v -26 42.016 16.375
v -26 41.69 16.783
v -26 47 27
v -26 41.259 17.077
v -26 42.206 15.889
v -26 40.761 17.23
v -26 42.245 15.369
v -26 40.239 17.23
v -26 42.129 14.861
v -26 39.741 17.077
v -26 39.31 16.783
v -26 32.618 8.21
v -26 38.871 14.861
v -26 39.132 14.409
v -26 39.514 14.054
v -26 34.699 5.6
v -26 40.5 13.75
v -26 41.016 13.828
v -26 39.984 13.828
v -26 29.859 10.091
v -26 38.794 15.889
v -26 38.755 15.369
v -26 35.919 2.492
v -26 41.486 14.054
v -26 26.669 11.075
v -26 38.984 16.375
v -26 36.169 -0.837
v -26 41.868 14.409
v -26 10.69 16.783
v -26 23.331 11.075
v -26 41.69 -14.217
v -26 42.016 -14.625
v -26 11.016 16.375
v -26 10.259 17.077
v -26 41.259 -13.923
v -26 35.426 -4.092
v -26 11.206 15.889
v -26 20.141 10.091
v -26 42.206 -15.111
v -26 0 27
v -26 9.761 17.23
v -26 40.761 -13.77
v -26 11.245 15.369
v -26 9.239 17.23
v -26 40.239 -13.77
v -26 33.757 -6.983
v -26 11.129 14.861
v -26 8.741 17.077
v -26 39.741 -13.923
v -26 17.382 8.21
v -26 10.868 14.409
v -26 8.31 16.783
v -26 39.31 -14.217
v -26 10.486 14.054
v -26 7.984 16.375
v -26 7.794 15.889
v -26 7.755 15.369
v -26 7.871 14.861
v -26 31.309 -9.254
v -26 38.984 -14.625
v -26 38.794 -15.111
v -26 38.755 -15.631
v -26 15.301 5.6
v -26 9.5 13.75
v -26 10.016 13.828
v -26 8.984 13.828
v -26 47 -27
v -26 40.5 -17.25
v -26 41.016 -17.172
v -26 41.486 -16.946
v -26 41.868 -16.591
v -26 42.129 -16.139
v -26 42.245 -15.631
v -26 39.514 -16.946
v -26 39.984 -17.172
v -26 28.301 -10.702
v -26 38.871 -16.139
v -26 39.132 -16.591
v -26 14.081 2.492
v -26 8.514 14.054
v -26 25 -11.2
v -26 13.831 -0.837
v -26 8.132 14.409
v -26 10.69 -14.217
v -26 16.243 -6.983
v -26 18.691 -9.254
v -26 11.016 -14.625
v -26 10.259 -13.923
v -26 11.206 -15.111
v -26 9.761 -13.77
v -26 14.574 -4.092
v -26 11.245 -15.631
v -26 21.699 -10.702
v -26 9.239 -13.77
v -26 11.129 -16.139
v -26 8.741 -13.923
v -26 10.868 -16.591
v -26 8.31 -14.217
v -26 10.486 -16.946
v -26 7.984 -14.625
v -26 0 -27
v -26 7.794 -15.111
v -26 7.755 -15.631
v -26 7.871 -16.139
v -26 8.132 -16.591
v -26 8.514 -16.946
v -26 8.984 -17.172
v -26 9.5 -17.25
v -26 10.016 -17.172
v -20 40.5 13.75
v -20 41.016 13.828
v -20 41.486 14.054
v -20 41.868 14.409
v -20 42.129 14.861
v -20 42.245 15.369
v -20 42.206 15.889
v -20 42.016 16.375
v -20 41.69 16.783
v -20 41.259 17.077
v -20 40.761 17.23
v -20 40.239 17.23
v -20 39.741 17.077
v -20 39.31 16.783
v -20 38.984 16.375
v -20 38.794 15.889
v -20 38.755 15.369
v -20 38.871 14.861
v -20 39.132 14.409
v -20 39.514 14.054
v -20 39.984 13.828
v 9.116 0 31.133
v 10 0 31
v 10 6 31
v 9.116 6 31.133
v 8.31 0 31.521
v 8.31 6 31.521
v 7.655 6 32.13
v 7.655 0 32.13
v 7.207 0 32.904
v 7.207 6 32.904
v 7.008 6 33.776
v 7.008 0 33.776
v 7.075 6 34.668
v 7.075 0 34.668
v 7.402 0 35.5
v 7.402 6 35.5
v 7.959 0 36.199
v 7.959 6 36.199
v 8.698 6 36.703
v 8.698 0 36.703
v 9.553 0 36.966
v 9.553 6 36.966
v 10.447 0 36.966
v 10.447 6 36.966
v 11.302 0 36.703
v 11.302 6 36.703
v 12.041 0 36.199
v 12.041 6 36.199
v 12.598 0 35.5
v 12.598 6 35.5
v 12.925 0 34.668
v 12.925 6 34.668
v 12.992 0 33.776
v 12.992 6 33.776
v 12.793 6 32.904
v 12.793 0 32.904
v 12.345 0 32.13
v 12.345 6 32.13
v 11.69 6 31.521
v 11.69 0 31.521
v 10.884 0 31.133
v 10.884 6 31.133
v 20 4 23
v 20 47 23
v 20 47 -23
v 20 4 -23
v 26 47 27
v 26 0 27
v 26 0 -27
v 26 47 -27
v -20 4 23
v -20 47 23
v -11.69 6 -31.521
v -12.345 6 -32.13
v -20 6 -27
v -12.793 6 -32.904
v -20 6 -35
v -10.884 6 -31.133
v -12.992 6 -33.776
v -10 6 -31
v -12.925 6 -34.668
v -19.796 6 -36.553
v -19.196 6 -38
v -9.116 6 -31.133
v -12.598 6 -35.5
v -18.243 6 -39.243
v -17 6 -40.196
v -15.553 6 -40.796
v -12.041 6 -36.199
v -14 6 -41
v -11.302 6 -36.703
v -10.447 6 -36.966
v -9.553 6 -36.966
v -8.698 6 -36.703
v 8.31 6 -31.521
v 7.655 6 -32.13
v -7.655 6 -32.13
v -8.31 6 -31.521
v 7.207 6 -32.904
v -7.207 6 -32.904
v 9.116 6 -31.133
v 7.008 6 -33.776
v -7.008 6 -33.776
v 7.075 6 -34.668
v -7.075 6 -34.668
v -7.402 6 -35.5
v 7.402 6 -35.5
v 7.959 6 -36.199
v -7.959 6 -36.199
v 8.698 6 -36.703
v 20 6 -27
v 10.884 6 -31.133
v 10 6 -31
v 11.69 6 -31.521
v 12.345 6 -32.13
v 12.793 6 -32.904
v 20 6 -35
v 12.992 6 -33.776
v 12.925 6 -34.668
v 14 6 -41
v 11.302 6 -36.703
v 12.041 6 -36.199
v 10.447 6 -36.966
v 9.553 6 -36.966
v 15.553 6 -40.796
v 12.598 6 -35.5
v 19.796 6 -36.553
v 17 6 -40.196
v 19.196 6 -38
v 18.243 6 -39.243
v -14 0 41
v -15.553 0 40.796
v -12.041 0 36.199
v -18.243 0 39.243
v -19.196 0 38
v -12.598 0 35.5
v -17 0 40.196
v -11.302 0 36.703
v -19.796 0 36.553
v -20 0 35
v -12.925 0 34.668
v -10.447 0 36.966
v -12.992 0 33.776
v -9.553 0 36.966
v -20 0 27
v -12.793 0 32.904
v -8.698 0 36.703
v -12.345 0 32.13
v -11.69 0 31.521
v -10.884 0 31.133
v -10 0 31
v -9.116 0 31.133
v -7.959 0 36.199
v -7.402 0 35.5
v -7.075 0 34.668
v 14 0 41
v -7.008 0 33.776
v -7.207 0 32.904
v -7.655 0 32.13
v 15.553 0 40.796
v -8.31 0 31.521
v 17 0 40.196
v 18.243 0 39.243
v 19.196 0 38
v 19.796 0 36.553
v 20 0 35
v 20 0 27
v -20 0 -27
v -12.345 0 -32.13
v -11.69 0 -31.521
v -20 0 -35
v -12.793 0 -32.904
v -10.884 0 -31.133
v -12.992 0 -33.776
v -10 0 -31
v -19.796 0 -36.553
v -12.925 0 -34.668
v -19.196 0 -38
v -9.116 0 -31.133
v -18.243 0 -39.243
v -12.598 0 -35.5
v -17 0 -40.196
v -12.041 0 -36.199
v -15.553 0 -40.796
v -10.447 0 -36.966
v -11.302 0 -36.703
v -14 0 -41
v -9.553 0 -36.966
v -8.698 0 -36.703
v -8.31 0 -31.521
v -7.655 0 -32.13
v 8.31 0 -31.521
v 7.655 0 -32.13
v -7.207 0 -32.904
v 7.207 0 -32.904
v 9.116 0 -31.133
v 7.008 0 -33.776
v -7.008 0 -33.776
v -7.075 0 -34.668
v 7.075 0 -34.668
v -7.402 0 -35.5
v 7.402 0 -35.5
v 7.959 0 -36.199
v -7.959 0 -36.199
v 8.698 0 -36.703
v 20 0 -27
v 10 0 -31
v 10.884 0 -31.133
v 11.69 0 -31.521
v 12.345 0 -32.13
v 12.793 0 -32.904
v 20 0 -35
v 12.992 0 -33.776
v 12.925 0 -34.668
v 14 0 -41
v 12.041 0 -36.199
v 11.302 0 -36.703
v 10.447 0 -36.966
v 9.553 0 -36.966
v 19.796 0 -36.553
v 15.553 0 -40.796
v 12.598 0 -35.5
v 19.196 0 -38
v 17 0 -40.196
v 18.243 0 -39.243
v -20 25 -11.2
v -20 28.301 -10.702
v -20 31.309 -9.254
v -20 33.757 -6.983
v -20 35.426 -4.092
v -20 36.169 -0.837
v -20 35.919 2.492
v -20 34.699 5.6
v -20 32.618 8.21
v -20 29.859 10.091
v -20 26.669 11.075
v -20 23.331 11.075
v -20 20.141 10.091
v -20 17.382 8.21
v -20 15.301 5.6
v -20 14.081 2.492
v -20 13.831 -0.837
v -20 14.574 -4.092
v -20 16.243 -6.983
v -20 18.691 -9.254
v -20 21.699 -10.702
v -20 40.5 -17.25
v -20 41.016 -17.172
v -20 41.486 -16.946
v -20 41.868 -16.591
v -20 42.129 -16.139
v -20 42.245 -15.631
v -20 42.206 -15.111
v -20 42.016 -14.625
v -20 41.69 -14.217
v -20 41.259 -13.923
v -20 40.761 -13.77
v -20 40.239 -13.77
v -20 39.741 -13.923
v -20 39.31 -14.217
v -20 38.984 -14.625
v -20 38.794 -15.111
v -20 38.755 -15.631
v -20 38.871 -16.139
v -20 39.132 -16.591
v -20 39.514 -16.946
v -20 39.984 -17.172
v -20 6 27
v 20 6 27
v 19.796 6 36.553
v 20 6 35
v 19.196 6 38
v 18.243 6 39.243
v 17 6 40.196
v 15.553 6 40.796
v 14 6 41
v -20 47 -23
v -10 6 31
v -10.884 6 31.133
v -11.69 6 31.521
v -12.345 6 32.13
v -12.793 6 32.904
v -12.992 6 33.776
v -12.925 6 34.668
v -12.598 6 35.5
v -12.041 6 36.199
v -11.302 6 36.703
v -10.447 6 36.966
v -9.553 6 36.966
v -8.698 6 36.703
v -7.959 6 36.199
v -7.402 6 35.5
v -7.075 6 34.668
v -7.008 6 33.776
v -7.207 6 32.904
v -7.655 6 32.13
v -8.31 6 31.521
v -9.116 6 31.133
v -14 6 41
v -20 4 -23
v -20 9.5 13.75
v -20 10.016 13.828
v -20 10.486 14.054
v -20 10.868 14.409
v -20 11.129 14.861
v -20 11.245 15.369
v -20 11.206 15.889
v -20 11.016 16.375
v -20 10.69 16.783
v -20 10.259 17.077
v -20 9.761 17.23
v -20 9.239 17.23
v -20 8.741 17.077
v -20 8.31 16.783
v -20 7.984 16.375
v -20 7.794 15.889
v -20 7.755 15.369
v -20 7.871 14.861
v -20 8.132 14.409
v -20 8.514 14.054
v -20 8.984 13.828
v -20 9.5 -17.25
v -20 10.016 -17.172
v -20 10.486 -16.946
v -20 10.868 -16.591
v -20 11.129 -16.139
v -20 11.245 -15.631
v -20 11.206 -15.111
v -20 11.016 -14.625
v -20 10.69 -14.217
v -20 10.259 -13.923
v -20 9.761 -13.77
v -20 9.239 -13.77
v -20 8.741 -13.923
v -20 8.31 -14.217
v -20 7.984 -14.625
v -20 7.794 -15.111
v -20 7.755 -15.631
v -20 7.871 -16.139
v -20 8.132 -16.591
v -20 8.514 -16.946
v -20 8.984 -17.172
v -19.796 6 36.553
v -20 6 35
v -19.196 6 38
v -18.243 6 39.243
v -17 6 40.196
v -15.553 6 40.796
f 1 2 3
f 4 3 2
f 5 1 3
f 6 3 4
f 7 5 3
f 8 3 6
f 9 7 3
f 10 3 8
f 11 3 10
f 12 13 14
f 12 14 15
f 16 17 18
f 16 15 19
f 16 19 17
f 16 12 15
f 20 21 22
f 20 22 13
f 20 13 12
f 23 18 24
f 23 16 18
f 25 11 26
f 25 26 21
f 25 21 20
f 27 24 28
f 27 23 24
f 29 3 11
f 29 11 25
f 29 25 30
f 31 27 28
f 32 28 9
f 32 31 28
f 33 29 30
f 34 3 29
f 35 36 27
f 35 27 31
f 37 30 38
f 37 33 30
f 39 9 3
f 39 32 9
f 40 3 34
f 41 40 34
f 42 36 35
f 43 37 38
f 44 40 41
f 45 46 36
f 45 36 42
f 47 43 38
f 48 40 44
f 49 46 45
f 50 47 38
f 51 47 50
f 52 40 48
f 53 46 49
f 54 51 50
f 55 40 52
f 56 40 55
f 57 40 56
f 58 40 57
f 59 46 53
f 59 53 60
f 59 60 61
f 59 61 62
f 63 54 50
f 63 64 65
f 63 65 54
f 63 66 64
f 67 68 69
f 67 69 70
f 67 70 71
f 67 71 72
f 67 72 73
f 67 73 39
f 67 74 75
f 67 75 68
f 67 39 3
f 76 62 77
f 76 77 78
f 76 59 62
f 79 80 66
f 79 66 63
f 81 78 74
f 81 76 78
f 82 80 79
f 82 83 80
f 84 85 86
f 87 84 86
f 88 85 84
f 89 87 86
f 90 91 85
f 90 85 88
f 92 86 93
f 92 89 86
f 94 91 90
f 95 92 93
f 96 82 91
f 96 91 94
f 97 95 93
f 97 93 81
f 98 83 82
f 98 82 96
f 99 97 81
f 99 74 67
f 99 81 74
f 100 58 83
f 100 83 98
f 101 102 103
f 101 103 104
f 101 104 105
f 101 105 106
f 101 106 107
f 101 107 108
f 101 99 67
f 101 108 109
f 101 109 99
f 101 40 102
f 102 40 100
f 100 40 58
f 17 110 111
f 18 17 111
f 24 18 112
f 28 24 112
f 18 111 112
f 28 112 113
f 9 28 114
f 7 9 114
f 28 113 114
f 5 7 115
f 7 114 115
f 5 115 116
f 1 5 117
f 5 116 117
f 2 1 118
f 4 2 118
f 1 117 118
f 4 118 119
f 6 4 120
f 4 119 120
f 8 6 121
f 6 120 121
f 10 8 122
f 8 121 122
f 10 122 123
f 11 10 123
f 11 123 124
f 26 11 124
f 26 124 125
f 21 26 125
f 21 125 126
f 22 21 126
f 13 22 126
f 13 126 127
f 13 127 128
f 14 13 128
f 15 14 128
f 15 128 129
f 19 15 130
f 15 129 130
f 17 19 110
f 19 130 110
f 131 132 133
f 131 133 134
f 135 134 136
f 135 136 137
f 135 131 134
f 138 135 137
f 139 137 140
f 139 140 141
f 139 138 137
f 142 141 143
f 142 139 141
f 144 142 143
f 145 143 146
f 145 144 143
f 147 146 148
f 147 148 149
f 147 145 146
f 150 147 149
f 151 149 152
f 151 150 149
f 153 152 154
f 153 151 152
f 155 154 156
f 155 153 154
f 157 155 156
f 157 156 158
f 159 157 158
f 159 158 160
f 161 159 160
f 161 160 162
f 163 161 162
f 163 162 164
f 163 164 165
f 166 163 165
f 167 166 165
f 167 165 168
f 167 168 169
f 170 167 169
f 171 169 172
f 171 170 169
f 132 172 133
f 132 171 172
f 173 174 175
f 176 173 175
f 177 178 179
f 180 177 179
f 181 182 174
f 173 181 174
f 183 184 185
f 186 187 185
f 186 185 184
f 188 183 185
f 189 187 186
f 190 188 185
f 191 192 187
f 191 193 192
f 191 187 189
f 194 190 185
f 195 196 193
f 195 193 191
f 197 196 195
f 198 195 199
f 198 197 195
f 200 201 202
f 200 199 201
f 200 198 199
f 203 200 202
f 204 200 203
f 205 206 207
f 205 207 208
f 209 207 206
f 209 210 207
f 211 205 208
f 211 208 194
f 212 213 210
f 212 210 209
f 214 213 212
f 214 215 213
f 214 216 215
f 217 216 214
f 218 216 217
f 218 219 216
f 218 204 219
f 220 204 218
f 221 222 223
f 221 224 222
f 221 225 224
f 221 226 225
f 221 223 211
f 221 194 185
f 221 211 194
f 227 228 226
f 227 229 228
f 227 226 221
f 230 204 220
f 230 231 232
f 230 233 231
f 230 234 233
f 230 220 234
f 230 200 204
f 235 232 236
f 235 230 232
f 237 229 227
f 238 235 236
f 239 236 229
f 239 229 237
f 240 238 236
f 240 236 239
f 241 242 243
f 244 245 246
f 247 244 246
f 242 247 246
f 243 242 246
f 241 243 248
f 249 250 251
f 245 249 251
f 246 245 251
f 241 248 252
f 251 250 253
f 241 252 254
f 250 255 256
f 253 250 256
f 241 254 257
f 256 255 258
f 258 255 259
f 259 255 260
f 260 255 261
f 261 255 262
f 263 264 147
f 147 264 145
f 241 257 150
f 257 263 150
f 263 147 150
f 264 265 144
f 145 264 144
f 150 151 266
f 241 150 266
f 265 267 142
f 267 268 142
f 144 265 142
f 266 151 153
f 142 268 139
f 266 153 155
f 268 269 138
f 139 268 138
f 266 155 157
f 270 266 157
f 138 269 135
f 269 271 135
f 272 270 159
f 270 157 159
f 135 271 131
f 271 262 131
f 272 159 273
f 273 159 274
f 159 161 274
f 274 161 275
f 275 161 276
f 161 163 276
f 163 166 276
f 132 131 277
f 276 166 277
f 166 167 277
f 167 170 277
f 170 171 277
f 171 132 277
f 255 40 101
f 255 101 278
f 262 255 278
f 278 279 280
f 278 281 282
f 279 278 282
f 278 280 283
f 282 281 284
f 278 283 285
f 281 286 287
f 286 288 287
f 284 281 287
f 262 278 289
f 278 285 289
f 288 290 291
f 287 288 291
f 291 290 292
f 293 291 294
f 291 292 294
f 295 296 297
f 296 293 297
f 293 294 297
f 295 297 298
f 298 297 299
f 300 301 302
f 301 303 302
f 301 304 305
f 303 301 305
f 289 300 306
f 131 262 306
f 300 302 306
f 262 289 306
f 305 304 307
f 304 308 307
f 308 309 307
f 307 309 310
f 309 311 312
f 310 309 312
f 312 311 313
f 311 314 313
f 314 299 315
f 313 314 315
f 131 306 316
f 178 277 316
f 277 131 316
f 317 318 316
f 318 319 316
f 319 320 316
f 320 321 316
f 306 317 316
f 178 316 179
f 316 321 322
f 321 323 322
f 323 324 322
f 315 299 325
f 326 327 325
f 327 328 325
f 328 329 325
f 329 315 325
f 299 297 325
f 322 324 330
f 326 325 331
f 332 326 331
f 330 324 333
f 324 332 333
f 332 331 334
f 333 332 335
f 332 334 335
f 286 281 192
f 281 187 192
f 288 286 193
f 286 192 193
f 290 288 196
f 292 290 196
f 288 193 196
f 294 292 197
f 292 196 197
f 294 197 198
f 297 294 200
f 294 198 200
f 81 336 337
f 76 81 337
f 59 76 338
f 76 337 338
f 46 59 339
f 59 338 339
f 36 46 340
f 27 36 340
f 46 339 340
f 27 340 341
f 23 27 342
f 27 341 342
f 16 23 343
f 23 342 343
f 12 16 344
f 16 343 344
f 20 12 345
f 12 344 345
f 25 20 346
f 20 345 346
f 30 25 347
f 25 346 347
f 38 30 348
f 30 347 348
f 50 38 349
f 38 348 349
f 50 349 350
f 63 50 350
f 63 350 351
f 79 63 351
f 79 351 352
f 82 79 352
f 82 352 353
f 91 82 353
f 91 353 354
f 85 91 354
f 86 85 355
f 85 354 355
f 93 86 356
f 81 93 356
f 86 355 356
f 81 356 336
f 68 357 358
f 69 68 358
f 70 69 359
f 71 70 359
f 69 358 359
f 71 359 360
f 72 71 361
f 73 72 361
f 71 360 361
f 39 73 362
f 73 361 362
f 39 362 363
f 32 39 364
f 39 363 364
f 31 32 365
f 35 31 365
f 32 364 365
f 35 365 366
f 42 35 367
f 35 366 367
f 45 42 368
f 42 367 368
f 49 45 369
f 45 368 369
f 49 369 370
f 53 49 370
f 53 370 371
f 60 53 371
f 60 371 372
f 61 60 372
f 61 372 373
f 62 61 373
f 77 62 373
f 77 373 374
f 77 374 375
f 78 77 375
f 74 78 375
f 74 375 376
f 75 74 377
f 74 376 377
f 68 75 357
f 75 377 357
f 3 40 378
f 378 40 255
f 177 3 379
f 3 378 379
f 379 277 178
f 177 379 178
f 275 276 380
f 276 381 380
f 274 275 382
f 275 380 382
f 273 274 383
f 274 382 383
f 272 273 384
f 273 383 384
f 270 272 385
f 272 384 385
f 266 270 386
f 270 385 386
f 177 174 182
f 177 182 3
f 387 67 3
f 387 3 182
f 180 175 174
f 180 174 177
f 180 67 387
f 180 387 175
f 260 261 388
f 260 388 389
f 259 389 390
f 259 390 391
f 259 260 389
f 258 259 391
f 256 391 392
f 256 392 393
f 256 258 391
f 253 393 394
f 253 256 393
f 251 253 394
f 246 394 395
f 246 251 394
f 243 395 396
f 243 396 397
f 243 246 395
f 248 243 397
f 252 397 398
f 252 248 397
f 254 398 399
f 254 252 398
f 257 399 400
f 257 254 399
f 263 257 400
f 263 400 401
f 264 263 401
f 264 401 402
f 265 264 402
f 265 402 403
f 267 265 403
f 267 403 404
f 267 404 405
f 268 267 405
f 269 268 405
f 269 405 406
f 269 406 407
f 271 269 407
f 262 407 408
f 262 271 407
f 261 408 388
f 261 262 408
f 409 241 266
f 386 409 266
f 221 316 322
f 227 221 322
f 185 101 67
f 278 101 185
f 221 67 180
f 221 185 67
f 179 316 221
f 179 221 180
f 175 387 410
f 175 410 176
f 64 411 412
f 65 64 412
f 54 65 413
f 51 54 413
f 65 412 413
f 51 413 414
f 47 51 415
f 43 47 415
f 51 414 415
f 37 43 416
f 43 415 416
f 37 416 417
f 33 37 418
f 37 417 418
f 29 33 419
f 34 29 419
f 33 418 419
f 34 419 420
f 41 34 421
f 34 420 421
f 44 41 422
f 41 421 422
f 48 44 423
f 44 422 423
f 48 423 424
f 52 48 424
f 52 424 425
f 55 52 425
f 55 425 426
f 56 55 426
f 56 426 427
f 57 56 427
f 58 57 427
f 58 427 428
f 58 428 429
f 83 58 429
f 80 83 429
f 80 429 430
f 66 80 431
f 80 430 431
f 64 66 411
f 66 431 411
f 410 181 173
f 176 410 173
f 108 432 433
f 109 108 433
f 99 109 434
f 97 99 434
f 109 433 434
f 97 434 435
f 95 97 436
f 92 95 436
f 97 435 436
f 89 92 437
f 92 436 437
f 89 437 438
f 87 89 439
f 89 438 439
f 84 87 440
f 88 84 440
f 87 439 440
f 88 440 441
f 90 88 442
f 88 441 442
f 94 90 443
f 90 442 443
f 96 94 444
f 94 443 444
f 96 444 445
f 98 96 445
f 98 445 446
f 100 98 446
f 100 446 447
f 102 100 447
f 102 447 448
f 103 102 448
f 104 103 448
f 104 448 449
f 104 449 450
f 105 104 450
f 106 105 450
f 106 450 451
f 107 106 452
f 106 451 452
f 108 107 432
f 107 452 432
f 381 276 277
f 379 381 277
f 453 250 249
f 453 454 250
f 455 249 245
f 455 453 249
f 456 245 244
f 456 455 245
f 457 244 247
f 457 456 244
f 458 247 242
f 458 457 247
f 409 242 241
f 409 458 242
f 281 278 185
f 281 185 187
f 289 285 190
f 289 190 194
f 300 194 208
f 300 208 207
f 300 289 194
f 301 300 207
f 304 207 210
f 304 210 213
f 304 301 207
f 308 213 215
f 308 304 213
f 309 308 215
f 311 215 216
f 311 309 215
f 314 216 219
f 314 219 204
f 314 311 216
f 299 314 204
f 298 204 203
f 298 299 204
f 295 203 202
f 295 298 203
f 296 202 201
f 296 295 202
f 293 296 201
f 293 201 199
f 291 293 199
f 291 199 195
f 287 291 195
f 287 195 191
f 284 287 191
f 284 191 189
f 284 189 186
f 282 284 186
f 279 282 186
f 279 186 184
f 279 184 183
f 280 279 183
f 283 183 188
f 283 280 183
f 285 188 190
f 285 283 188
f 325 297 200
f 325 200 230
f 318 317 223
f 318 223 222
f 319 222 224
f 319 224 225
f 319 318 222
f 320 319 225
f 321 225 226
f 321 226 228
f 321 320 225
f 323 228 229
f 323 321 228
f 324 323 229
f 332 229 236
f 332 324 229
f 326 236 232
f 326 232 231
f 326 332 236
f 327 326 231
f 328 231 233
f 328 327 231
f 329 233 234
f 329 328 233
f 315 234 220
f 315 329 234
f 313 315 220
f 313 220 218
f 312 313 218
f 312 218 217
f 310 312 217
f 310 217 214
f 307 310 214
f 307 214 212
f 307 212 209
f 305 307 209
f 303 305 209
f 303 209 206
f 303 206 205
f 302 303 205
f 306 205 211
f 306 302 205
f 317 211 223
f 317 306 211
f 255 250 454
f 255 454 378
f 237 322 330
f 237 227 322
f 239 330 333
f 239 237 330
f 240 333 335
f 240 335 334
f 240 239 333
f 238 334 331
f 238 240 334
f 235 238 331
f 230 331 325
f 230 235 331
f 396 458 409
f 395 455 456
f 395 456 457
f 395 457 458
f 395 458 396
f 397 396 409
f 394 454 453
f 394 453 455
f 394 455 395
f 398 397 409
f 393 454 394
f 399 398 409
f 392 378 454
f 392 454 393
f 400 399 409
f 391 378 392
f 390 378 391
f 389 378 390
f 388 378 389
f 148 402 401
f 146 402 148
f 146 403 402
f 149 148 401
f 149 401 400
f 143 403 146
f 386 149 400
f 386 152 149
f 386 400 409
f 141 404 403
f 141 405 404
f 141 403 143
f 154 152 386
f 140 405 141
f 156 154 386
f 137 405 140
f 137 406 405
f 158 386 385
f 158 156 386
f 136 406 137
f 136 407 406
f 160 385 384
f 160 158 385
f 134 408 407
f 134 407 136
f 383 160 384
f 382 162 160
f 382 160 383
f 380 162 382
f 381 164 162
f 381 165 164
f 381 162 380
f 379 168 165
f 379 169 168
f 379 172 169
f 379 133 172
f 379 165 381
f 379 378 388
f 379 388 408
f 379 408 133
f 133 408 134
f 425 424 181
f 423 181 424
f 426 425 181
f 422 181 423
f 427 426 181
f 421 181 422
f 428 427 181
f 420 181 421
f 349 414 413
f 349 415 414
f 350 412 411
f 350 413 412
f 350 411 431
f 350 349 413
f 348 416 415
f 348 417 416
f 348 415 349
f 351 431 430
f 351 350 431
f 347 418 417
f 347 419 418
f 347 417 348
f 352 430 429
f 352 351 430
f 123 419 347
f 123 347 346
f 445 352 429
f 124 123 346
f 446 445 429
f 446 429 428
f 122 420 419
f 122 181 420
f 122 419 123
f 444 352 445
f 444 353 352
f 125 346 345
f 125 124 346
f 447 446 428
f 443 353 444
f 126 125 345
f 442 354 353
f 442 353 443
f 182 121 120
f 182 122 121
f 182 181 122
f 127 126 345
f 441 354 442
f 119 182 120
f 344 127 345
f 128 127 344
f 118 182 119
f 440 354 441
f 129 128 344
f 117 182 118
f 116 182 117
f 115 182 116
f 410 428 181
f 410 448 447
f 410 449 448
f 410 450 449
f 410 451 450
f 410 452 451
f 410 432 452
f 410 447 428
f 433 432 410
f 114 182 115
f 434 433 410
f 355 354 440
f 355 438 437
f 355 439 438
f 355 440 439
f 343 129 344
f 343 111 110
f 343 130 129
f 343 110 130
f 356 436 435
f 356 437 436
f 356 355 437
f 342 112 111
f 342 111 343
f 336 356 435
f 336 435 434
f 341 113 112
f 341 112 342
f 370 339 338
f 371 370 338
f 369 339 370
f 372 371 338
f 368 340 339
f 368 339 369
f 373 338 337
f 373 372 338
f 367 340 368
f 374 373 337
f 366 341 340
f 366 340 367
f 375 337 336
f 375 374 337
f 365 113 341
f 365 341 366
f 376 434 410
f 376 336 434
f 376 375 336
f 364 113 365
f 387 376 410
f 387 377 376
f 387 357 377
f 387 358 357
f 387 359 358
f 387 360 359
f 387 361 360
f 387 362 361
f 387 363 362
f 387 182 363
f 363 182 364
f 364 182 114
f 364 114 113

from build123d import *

# Parameters (mm, degrees)
SKETCH_1_W          = 52
SKETCH_1_H          = 54
EXTRUDE_1_DEPTH     = 47
CUT_EXTRUDE_START   = 47
SKETCH_2_W          = 40
SKETCH_2_H          = 46
CUT_EXTRUDE_1_DEPTH = 43
CUT_EXTRUDE_START_2 = -20
SKETCH_4_R          = 11.2
SKETCH_4_R_2        = 1.75
CUT_EXTRUDE_3_DEPTH = 6
SKETCH_5_W          = 40
SKETCH_5_H          = 14
SKETCH_5_R          = 3
EXTRUDE_2_DEPTH     = 6
FILLET_1_R          = 6


with BuildPart() as part:
    # 草图1 → 凸台-拉伸1 (new body)
    with BuildSketch(Plane(origin=(0, 0, 0), x_dir=(1, 0, 0), z_dir=(0, 1, 0))):
        Rectangle(SKETCH_1_W, SKETCH_1_H)
    extrude(amount=EXTRUDE_1_DEPTH)

    # 草图2 → 切除-拉伸1 (cut)
    with BuildSketch(Plane(origin=(0, 0, 0), x_dir=(1, 0, 0), z_dir=(0, 1, 0)).offset(CUT_EXTRUDE_START)):
        Rectangle(SKETCH_2_W, SKETCH_2_H)
    extrude(amount=-CUT_EXTRUDE_1_DEPTH, mode=Mode.SUBTRACT)

    # 草图4 → 切除-拉伸3 (cut)
    with BuildSketch(Plane(origin=(0, 0, 0), x_dir=(0, 0, -1), z_dir=(1, 0, 0)).offset(CUT_EXTRUDE_START_2)):
        with Locations((0, 25)):
            Circle(SKETCH_4_R)
        with Locations((-15.5, 40.5)):
            Circle(SKETCH_4_R_2)
        with Locations((15.5, 40.5)):
            Circle(SKETCH_4_R_2)
        with Locations((15.5, 9.5)):
            Circle(SKETCH_4_R_2)
        with Locations((-15.5, 9.5)):
            Circle(SKETCH_4_R_2)
    extrude(amount=-CUT_EXTRUDE_3_DEPTH, mode=Mode.SUBTRACT)

    # 草图5 → 凸台-拉伸2 (add)
    # profile 1 of 2: a face of its own
    with BuildSketch(Plane(origin=(0, 0, 0), x_dir=(1, 0, 0), z_dir=(0, 1, 0))):
        with Locations((0, 34)):
            Rectangle(SKETCH_5_W, SKETCH_5_H)
        with Locations(Location((-10, 34, 0), (0, 0, 270))):
            Circle(SKETCH_5_R, mode=Mode.SUBTRACT)
        with Locations(Location((10, 34, 0), (0, 0, 270))):
            Circle(SKETCH_5_R, mode=Mode.SUBTRACT)
    # profile 2 of 2: a face of its own
    with BuildSketch(Plane(origin=(0, 0, 0), x_dir=(1, 0, 0), z_dir=(0, 1, 0))):
        with Locations((0, -34)):
            Rectangle(SKETCH_5_W, SKETCH_5_H)
        with Locations(Location((10, -34, 0), (0, 0, 90))):
            Circle(SKETCH_5_R, mode=Mode.SUBTRACT)
        with Locations(Location((-10, -34, 0), (0, 0, 90))):
            Circle(SKETCH_5_R, mode=Mode.SUBTRACT)
    extrude(amount=EXTRUDE_2_DEPTH)

    # 圆角1
    fillet_1_edges = [part.edges().sort_by_distance(p)[0] for p in [
        (-20, 3, -41),
        (20, 3, -41),
        (-20, 3, 41),
        (20, 3, 41),
    ]]
    fillet(fillet_1_edges, radius=FILLET_1_R)


solid = part.part
